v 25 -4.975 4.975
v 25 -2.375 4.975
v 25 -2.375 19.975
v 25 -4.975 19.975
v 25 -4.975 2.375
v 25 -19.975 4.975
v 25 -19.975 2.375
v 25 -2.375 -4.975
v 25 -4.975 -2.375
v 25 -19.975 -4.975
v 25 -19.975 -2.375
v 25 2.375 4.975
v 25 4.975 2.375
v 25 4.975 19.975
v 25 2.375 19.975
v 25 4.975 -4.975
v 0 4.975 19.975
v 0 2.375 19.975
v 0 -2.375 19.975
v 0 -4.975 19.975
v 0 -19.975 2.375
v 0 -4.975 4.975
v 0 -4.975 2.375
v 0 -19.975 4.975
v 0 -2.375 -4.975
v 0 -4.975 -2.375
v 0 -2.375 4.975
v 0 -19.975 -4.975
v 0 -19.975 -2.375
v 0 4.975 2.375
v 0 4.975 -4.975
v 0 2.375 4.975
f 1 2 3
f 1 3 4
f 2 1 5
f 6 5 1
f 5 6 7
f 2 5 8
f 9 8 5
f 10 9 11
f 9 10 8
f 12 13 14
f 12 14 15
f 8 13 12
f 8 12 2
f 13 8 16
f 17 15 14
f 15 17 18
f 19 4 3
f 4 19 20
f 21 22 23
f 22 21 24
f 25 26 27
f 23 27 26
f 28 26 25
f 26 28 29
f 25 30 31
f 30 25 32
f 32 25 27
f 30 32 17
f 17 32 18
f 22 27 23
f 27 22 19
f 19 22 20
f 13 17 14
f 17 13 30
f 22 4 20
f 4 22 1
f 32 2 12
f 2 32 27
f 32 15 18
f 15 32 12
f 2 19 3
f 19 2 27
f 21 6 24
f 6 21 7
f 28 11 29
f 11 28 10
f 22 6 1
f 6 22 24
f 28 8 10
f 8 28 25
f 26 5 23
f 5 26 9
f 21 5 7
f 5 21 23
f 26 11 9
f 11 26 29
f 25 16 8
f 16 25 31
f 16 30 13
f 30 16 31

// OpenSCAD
$fa=4; // default minimum facet angle is now 0.5
$fs=0.05; // default minimum facet size is now 0.05 mm

gapWidth = 4.75;
gapDepth = 15;
tabLen = 25;
wallThickness = 2.6;

// Quad Corner

// translate([-gapWidth / 2 - wallThickness, -gapWidth / 2 - wallThickness, 0]) cube([gapWidth + wallThickness * 2, gapWidth + wallThickness * 2, gapDepth + wallThickness]);
// difference() {
//   cylinder(r = tabLen, h = wallThickness);
//   cylinder(r = tabLen / 2 , h = wallThickness);
// }
// intersection() {
//   for (i=[0:90:270]) {
//     rotate([0, 0, i]) translate([gapWidth / 2, -wallThickness - gapWidth / 2, 0]) {
//       difference() {
//         cube([tabLen, wallThickness * 2 + gapWidth, gapDepth + wallThickness]);
//         translate([0, wallThickness, wallThickness]) cube([tabLen, gapWidth, gapDepth]);
//       }
//     }
//   }
//   sphere(r = tabLen);
// }

// Edge 90


translate([0, gapWidth / -2 - wallThickness, gapWidth / -2 - wallThickness]) cube([tabLen, gapWidth + wallThickness * 2, gapWidth + wallThickness * 2]);
for (i=[0:90:90]) {
  rotate([i, 0, 0]) translate([0, gapWidth / -2 - wallThickness, gapWidth / 2]) {
    difference() {
      cube([tabLen, wallThickness * 2 + gapWidth, gapDepth + wallThickness]);
      translate([0, wallThickness, wallThickness]) cube([tabLen, gapWidth, gapDepth]);
    }
  }
}
